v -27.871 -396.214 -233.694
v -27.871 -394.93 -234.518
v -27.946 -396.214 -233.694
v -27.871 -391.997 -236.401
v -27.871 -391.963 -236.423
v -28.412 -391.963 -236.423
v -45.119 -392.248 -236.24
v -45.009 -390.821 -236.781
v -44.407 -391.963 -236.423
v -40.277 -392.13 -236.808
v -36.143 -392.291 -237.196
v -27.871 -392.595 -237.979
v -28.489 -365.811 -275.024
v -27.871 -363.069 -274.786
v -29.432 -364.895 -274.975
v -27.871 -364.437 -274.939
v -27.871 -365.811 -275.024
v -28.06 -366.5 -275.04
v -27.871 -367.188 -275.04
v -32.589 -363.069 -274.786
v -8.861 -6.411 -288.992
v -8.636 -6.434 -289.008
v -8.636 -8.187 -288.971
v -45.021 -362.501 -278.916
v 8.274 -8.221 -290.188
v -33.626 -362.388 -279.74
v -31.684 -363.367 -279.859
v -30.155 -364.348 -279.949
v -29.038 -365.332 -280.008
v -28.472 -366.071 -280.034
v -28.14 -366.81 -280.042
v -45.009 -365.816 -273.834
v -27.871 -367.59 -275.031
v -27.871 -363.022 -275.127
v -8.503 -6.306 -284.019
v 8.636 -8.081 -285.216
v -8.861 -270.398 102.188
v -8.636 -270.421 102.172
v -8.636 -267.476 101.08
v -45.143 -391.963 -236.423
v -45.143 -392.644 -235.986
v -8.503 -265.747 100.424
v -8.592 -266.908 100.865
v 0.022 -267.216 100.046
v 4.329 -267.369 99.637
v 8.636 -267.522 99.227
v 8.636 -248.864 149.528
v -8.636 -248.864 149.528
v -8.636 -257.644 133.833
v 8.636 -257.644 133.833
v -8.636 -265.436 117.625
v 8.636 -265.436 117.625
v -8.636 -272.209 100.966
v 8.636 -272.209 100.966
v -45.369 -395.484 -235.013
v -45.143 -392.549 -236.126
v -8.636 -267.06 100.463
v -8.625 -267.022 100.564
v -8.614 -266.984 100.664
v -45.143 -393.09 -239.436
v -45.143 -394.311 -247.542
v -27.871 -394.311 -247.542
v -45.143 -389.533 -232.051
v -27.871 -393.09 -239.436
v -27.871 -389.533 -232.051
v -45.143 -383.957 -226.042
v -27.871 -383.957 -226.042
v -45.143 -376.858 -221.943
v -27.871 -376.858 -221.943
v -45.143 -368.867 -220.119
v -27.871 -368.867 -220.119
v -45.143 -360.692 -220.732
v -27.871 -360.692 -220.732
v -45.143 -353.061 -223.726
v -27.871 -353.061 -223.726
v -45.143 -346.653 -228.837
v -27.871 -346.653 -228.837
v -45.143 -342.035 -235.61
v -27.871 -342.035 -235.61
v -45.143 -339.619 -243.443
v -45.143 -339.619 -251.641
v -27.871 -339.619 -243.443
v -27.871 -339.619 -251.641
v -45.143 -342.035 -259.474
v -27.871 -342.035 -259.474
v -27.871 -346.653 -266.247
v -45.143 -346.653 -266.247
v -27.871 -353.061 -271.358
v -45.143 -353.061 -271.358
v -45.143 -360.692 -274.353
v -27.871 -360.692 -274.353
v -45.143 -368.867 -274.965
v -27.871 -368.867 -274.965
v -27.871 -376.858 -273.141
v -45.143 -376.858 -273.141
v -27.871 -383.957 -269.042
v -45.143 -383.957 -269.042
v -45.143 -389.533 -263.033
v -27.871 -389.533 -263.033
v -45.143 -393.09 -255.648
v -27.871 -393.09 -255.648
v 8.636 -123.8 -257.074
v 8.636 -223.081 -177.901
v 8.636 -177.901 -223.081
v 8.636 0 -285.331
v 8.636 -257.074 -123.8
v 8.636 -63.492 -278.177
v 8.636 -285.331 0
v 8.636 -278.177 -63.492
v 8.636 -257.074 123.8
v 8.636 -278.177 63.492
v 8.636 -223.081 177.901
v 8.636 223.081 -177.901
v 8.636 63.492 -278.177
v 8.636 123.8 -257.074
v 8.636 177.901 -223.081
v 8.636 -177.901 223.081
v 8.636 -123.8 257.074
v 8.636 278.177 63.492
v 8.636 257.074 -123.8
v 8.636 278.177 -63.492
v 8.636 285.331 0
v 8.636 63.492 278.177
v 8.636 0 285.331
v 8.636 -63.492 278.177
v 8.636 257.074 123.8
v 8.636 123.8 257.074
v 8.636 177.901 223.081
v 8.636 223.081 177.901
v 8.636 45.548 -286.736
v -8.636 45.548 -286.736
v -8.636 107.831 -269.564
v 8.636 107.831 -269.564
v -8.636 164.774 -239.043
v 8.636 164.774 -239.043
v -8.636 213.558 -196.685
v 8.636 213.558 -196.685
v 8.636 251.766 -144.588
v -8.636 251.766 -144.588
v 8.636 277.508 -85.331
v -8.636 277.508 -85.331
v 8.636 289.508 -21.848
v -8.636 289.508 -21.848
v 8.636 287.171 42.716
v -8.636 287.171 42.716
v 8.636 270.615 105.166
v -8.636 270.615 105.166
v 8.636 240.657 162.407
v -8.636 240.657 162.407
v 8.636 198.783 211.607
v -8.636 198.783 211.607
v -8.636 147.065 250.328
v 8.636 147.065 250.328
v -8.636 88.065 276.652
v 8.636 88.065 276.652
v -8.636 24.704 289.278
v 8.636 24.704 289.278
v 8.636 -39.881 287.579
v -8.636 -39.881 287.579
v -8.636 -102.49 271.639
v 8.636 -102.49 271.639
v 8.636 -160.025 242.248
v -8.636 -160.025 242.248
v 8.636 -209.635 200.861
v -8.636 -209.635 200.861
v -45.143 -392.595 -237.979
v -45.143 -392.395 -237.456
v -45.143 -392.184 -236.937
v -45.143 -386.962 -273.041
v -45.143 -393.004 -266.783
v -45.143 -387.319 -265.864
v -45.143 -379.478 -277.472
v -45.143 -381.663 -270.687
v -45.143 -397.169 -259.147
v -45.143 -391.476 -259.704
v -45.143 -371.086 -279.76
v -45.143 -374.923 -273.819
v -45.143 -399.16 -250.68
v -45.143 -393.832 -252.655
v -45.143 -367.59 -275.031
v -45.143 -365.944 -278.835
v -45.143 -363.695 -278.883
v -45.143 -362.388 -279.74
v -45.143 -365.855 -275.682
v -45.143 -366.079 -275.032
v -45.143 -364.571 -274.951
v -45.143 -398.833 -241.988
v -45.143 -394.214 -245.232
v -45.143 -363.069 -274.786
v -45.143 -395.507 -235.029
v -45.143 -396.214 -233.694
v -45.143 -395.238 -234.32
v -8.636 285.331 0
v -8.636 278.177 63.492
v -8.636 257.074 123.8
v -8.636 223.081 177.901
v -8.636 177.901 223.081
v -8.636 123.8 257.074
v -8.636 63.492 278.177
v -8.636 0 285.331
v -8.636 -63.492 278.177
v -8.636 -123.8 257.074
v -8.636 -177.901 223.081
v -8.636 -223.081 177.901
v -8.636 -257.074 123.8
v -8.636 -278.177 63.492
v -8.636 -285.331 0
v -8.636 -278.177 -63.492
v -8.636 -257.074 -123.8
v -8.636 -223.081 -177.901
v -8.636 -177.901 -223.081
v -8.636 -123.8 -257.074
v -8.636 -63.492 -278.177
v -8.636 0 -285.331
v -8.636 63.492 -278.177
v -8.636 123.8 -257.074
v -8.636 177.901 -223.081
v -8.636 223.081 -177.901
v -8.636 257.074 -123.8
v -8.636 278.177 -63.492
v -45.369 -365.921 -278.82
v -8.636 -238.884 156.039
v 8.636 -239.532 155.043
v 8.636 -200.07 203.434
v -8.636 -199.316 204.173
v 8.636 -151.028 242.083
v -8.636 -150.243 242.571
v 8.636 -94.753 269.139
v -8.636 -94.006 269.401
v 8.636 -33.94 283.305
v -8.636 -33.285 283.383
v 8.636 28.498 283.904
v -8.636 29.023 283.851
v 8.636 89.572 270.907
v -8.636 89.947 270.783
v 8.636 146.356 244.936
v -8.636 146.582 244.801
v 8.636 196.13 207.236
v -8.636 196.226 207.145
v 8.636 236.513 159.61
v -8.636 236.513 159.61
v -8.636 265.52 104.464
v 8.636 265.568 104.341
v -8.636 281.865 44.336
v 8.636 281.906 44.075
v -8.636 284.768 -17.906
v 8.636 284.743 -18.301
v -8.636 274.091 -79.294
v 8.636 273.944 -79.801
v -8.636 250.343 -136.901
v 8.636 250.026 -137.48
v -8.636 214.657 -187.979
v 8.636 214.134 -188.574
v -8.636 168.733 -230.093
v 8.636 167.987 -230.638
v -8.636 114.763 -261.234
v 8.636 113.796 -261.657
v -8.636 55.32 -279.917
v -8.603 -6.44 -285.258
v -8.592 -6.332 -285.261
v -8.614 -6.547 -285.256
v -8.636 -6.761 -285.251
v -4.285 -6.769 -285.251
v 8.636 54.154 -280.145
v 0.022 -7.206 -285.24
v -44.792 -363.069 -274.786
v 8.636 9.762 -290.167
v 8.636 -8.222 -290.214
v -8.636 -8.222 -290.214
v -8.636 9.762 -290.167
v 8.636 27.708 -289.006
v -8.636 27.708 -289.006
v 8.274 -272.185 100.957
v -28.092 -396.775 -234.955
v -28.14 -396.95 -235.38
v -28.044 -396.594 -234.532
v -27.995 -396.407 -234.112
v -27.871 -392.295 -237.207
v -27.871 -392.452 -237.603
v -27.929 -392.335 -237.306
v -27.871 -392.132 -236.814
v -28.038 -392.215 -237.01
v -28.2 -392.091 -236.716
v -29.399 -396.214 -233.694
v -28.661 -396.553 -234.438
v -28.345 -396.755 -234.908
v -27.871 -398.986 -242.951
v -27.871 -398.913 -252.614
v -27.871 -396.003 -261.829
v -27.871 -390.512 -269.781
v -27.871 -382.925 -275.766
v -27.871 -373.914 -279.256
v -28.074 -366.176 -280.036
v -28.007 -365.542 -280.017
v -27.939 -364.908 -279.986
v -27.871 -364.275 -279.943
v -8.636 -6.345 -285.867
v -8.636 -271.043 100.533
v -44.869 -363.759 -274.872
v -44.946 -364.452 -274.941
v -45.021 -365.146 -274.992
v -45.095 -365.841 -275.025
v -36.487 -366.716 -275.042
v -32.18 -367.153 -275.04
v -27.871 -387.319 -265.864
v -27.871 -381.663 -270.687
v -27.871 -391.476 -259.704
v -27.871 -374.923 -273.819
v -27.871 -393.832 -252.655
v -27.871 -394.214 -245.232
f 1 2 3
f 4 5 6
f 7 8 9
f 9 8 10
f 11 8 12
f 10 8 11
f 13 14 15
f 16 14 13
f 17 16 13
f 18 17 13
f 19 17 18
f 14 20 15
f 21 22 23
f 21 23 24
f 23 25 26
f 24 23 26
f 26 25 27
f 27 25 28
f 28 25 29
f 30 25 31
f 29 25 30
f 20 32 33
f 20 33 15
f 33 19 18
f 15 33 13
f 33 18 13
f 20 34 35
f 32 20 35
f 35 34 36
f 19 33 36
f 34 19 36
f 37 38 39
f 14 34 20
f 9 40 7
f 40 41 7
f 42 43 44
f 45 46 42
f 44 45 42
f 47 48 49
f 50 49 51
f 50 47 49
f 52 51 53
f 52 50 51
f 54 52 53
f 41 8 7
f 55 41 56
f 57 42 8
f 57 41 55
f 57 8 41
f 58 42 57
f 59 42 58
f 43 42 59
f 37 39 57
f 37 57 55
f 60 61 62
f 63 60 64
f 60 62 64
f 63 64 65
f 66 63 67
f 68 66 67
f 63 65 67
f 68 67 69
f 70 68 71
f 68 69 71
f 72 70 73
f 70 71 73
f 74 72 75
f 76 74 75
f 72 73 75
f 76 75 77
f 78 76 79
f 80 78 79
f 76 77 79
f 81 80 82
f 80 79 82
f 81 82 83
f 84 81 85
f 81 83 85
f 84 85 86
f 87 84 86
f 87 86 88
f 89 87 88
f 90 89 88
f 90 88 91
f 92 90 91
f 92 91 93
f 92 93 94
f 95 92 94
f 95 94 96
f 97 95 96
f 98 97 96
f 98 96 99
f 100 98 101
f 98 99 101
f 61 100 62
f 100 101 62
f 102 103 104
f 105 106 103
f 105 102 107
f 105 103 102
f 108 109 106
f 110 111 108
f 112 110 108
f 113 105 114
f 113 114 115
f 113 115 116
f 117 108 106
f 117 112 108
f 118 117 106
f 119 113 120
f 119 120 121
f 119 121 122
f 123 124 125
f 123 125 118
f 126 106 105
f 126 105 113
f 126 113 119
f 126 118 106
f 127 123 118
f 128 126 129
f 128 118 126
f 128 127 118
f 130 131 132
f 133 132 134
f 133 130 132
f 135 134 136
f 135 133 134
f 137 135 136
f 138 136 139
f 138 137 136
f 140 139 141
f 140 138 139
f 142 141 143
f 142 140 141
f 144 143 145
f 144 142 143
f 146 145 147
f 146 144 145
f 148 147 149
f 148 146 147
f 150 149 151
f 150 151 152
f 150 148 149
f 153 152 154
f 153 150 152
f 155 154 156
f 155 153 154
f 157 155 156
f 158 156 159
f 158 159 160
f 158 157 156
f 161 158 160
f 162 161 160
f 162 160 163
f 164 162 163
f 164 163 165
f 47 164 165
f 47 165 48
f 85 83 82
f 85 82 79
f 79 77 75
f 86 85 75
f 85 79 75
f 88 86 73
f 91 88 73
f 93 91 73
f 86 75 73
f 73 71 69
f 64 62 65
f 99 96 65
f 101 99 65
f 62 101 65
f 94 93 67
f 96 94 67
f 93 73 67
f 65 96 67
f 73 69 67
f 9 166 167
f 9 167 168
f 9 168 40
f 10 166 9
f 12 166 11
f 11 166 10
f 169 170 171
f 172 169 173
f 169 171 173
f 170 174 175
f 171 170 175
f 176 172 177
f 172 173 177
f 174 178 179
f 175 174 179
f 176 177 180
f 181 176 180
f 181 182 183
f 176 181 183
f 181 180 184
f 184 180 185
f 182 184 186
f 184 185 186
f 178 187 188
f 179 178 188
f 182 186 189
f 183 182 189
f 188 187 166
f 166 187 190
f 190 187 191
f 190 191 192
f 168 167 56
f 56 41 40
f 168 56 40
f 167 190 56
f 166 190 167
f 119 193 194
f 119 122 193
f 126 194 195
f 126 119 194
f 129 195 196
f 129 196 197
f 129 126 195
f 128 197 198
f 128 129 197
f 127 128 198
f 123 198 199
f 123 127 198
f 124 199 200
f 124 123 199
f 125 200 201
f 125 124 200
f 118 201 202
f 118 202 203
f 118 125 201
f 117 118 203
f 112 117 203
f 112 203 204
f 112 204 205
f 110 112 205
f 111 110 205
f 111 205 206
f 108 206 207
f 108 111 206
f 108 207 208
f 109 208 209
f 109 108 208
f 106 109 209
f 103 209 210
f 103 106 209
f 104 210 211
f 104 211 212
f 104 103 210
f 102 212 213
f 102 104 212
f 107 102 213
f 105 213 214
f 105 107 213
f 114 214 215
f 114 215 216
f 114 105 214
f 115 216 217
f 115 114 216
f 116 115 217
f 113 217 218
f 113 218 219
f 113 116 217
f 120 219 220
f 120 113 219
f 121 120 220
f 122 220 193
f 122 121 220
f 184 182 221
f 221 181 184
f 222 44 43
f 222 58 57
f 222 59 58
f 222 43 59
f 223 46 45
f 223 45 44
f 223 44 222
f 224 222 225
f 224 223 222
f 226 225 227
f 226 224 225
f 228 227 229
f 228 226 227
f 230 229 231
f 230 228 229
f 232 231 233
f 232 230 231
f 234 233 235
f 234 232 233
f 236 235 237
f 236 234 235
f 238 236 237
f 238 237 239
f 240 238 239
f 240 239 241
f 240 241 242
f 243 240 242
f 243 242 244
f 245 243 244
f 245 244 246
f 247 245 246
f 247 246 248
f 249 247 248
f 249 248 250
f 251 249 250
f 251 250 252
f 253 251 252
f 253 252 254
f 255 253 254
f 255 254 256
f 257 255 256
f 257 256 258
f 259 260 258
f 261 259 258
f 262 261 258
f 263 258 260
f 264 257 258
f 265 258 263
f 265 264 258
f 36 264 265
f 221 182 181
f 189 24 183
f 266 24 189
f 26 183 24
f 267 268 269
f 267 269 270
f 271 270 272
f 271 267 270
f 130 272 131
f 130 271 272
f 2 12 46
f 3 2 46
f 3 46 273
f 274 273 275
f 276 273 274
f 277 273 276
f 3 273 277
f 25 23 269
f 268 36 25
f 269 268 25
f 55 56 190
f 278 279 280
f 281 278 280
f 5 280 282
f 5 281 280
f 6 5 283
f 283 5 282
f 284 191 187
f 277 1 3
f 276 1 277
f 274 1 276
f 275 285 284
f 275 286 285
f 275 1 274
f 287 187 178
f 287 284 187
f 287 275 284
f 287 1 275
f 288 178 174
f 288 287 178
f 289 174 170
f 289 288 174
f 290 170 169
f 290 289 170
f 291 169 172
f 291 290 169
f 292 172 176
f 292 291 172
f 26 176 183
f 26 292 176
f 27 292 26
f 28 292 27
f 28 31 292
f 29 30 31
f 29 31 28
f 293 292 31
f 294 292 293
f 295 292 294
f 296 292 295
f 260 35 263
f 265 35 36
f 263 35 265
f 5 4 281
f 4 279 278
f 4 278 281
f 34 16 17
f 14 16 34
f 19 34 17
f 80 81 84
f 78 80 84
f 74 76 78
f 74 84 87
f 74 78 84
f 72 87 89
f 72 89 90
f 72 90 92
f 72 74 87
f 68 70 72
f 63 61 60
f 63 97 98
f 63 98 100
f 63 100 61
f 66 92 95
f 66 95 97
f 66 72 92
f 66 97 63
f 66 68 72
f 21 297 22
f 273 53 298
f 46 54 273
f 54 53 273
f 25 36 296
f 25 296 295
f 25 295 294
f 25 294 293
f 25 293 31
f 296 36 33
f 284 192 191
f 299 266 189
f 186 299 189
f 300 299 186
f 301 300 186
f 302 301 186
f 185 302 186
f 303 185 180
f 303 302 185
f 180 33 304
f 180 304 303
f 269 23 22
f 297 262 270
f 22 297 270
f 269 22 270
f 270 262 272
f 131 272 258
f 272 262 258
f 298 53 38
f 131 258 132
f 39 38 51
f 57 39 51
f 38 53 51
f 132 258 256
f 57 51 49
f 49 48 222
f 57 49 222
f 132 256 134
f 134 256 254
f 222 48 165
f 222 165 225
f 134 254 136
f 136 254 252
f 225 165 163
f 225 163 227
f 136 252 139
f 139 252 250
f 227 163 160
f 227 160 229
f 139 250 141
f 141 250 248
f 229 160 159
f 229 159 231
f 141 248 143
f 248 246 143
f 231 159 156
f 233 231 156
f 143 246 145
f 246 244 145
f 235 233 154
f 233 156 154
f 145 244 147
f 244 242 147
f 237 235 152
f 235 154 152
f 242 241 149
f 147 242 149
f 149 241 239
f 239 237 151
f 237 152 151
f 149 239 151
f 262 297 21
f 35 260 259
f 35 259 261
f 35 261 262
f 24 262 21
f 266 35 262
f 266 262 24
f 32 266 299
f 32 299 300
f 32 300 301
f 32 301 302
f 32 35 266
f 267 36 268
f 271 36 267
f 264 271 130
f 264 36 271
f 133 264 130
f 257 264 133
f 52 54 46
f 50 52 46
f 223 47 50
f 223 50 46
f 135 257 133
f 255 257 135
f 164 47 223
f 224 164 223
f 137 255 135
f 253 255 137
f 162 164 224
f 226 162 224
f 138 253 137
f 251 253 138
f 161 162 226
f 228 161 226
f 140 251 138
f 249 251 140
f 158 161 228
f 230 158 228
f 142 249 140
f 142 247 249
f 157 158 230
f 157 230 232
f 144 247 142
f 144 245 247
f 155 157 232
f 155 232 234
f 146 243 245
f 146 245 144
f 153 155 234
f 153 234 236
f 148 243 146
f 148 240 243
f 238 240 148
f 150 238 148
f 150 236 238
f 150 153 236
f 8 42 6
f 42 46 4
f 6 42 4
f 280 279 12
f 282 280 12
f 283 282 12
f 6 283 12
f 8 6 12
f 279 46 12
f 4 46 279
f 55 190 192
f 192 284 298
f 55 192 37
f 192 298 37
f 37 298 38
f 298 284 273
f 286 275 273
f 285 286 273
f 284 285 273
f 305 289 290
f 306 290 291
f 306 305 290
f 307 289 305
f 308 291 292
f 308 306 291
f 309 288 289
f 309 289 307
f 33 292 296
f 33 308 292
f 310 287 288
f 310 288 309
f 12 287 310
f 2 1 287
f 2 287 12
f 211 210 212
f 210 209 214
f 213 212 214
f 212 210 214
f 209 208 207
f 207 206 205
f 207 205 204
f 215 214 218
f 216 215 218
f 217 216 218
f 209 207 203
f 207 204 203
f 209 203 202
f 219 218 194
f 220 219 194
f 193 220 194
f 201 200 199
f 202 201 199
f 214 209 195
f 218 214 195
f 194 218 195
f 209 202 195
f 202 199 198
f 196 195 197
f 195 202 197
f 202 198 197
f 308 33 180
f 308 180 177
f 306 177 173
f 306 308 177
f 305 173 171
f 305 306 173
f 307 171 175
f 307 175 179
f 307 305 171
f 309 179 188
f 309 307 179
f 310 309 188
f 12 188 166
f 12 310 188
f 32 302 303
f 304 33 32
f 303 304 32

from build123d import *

# Parameters (mm, degrees)
F0_R      = 285.3309
F1_DEPTH  = 8.636
F4_R      = 27.4999958
F5_DEPTH  = 17.272
F9_DEPTH  = 17.272
F12_DEPTH = 17.272
F14_DEPTH = 17.272


with BuildPart() as f1:
    # F0 (on Right) → F1 (new body, symmetric)
    with BuildSketch(Plane.YZ):
        Circle(F0_R)
    extrude(amount=F1_DEPTH, both=True)


with BuildPart() as f5:
    # F4 (on plane+point) → F5 (new body)
    with BuildSketch(Plane(origin=(-27.8706326, 0, 0), x_dir=(0, -1, 0), z_dir=(-1, 0, 0))):
        with Locations((366.811433, -247.5421262)):
            Circle(F4_R)
    extrude(amount=F5_DEPTH)


with BuildPart() as f9:
    # F6 (on face) → F9 (new body, through all)
    with BuildSketch(Plane.YZ.offset(8.636)):
        with BuildLine():
            ThreePointArc((45.5478122499, -286.7358162038), (240.6572930034, 162.4072006381), (-248.8641948571, 149.5280709864))
            Line((-248.8641948571, 149.5280709864), (-267.5215065798, 99.2268411875))
            ThreePointArc((-267.5215065798, 99.2268411875), (50.4062012704, 280.8432612122), (285.3309, 0))
            ThreePointArc((285.3309, 0), (198.8819923056, -204.5963724785), (-8.0805435652, -285.2164569419))
            Line((-8.0805435652, -285.2164569419), (45.5478122499, -286.7358162038))
        make_face()
        with BuildLine():
            Line((-267.5215065798, 99.2268411875), (-248.8641948571, 149.5280709864))
            ThreePointArc((-248.8641948571, 149.5280709864), (-261.6658293387, 125.7896070879), (-272.2094234262, 100.965644121))
            Line((-272.2094234262, 100.965644121), (-267.5215065798, 99.2268411875))
        make_face()
        with BuildLine():
            ThreePointArc((-8.2221430829, -290.2144514974), (18.7437088264, -289.725223055), (45.5478122499, -286.7358162038))
            Line((45.5478122499, -286.7358162038), (-8.0805435652, -285.2164569419))
            Line((-8.0805435652, -285.2164569419), (-8.2221430829, -290.2144514974))
        make_face()
    extrude(amount=-F9_DEPTH)

    # F11 (on 3pt) → F12 (join)
    with BuildSketch(Plane(origin=(28.9472699963, -2.9967644368, -2.0223618286), x_dir=(-0.1024770702, -0.9947096022, 0.0071594218), z_dir=(-0.9922908993, 0.1027268574, 0.0693250603))):
        Polygon((366.6379115019, -281.3036351275), (366.5325688778, -276.3047449575), (5.1108173853, -283.921058662), (5.2158850342, -288.9069002593), align=None)
        Polygon((270.6071909513, 101.3220147825), (265.9316262262, 99.5874398647), (391.6702989577, -239.3424597695), (396.3581002221, -237.6033452516), align=None)
    extrude(amount=F12_DEPTH)

    # F13 (on face) → F14 (join)
    with BuildSketch(Plane.YZ.offset(-27.8706326)):
        with BuildLine():
            ThreePointArc((-392.5949717172, -237.9787115264), (-392.2909462423, -237.1959107597), (-391.9631609319, -236.4227579158))
            Line((-391.9631609319, -236.4227579158), (-396.2135714078, -233.6942388503))
            ThreePointArc((-396.2135714078, -233.6942388503), (-393.0036726401, -266.7831321413), (-362.388232945, -279.7397197168))
            Line((-362.388232945, -279.7397197168), (-363.0687253491, -274.786243151))
            ThreePointArc((-363.0687253491, -274.786243151), (-365.3244296393, -275.0018893091), (-367.5902302284, -275.0310920568))
            ThreePointArc((-367.5902302284, -275.0310920568), (-389.6063699042, -262.9252539878), (-392.5949717172, -237.9787115264))
        make_face()
    extrude(amount=-F14_DEPTH)


solid = Compound([f1.part, f5.part, f9.part])
